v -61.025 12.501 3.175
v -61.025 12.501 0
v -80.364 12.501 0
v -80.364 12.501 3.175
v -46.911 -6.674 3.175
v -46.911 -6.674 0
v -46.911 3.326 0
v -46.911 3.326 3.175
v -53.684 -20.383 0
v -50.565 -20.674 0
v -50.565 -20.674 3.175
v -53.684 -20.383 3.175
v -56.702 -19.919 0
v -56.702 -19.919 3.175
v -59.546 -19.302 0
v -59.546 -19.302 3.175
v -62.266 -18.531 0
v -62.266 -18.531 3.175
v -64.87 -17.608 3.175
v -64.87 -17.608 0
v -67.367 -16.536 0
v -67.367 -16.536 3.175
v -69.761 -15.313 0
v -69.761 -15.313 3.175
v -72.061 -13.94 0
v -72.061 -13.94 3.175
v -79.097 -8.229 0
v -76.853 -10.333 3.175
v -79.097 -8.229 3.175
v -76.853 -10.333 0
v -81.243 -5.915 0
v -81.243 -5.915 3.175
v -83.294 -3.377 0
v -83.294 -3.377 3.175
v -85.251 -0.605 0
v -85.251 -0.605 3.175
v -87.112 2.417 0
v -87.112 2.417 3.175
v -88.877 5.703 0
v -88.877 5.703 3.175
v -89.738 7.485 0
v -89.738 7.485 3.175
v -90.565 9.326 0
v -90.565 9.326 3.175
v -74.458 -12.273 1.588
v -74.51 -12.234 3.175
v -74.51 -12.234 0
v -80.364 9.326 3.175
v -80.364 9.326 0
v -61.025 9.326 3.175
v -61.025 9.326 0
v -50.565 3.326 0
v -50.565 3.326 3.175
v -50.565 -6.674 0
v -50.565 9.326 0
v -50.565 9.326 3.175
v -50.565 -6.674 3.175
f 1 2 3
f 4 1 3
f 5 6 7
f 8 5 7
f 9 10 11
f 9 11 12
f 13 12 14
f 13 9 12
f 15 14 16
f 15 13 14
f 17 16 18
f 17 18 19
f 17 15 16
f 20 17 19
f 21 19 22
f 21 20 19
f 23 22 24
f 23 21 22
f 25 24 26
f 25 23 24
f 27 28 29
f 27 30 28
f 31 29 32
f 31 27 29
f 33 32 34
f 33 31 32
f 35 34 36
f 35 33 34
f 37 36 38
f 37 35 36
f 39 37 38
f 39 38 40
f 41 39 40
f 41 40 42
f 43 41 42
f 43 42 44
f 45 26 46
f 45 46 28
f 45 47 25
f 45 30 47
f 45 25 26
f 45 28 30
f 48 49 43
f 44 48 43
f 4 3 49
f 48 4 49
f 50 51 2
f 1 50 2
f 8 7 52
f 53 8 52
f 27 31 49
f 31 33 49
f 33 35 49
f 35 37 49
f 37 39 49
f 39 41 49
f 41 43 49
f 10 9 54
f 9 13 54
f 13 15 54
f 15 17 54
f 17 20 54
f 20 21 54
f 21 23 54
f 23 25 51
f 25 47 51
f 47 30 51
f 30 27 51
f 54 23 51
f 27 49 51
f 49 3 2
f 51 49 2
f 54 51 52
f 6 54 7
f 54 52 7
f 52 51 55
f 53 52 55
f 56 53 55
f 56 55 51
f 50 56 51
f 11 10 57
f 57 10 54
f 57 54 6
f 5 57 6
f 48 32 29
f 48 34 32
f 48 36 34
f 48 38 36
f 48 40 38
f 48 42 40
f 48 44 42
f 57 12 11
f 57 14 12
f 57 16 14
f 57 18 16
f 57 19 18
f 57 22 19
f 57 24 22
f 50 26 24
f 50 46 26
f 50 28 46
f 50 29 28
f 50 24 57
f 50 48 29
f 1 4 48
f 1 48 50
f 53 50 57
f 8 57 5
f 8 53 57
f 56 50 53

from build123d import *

# Parameters (mm, degrees)
BOSS_EXTRUDE1_DEPTH = 3.175


with BuildPart() as part:
    # Sketch1 → Boss-Extrude1 (new body)
    with BuildSketch(Plane.XY):
        with BuildLine():
            Line((-50.564988155, 9.325788887), (-61.025093708, 9.325788887))
            Line((-61.025093708, 9.325788887), (-61.025093708, 12.500788887))
            Line((-61.025093708, 12.500788887), (-80.363597484, 12.500788887))
            Line((-80.363597484, 12.500788887), (-80.363597484, 9.325788887))
            Line((-80.363597484, 9.325788887), (-90.564988155, 9.325788887))
            add(Edge.make_bspline(
                [(-50.564988155, -20.674211113), (-78.351175561, -18.870925546), (-90.564988155, 9.325788887)],
                knots=[0, 0, 0, 1, 1, 1], degree=2))
            Line((-50.564988155, -20.674211113), (-50.564988155, -6.674211113))
            Line((-50.564988155, -6.674211113), (-46.911258203, -6.674211113))
            Line((-46.911258203, -6.674211113), (-46.911258203, 3.325788887))
            Line((-46.911258203, 3.325788887), (-50.564988155, 3.325788887))
            Line((-50.564988155, 3.325788887), (-50.564988155, 9.325788887))
        make_face()
    extrude(amount=BOSS_EXTRUDE1_DEPTH)


solid = part.part
